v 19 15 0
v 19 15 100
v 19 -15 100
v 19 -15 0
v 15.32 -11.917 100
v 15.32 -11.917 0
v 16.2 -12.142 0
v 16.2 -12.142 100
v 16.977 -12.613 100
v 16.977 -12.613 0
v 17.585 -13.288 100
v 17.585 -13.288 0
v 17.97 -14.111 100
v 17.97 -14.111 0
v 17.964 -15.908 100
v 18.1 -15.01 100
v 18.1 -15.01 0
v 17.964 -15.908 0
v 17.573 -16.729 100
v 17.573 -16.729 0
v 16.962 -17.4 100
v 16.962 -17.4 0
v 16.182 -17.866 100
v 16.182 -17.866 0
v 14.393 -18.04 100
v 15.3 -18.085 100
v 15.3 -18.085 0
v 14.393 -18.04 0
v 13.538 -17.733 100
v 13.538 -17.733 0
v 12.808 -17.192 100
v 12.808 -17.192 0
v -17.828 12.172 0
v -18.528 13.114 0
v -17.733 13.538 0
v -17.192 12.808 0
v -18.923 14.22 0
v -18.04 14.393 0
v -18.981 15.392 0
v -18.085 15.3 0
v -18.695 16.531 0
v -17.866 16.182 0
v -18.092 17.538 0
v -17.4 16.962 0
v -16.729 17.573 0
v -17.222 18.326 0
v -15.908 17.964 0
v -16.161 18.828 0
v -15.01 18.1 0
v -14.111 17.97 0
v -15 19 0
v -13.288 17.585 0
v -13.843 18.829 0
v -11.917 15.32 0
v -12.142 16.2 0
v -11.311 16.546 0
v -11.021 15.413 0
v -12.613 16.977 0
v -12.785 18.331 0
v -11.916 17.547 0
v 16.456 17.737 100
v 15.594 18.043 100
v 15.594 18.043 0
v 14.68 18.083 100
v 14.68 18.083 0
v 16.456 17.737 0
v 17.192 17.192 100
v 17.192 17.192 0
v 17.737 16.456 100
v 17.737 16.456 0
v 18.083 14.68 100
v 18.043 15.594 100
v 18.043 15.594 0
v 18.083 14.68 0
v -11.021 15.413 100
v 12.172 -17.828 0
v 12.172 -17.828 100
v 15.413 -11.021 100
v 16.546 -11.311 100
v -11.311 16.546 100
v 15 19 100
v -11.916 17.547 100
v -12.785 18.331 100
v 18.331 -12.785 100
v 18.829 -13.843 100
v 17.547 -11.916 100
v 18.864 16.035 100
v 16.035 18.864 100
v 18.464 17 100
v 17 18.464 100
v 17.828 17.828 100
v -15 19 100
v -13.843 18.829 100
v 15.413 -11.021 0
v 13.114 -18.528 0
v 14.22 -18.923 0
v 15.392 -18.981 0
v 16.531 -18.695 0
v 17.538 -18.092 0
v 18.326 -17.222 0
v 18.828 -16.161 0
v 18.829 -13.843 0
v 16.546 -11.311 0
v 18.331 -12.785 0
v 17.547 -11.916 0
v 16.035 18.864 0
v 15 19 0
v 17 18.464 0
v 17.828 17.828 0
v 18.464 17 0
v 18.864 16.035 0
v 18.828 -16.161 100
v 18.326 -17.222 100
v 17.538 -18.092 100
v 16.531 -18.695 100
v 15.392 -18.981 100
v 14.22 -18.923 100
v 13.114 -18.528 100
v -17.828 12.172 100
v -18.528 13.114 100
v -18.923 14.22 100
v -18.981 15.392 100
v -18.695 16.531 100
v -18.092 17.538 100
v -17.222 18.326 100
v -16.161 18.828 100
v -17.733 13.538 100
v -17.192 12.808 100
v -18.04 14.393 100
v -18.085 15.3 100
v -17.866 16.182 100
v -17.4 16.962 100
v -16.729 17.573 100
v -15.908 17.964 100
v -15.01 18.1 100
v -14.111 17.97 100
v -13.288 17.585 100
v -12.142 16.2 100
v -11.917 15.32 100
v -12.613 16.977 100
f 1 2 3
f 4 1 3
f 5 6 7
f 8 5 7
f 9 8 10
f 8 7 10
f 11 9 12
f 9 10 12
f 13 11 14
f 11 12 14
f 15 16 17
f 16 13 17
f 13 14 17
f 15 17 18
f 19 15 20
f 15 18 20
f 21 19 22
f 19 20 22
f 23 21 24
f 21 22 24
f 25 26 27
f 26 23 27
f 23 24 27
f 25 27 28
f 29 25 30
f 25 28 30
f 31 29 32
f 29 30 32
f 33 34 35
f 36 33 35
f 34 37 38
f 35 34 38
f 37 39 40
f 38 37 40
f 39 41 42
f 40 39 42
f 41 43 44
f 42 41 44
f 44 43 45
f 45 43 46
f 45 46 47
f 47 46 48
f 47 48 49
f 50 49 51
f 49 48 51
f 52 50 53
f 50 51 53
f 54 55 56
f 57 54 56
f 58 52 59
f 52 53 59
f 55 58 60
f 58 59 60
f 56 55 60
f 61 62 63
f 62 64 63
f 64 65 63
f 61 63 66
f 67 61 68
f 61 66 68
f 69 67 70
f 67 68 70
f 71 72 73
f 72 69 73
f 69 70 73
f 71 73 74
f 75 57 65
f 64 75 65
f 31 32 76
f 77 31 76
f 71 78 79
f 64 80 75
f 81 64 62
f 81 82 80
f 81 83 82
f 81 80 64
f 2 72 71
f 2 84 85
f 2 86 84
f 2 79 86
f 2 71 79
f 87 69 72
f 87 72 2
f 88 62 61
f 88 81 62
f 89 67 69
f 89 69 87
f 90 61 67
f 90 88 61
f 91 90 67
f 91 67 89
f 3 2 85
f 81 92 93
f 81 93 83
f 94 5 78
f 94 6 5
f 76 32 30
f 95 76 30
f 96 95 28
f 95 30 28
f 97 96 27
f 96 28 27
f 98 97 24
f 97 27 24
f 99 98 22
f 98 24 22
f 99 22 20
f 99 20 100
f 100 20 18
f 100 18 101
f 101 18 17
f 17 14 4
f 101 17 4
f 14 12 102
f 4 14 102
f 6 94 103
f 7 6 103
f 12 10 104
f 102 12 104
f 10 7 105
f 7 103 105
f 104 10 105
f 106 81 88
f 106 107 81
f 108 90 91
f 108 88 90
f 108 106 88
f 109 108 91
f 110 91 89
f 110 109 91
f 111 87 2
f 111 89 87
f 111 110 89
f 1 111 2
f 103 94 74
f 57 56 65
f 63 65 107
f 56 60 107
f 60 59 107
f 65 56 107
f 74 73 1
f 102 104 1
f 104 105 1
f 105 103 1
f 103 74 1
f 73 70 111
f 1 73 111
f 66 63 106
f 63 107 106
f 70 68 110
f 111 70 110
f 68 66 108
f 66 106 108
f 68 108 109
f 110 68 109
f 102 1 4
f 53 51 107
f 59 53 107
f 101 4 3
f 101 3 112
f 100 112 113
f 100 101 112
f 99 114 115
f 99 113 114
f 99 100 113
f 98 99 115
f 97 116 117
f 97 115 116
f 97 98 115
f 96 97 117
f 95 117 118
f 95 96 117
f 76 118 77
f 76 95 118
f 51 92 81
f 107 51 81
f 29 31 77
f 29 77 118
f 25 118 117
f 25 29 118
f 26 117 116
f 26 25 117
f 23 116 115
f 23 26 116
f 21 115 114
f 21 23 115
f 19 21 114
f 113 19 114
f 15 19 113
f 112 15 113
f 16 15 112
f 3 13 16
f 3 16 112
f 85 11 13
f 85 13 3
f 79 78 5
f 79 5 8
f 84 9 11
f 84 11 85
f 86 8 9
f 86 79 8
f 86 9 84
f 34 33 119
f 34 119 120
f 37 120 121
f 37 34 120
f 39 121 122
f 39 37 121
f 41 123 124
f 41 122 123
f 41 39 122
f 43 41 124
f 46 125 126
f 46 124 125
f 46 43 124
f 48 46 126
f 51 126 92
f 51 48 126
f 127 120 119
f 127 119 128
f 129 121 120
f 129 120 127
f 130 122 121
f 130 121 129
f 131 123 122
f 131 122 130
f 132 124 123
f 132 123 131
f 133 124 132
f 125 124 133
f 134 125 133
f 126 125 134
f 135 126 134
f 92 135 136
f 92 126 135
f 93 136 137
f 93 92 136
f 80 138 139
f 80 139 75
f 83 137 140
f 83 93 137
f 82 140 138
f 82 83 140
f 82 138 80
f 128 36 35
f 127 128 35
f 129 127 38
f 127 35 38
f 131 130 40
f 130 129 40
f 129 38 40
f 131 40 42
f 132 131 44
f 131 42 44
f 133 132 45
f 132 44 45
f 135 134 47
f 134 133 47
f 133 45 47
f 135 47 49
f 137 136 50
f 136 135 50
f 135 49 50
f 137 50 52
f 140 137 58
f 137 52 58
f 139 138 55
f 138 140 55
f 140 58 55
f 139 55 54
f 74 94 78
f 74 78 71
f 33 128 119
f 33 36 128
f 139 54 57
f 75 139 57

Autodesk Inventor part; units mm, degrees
ref_plane "YZ Plane" through (0, 0, 0) normal (1, 0, 0) x (0, 1, 0)
ref_plane "XZ Plane" through (0, 0, 0) normal (0, 1, 0) x (-1, 0, 0)
ref_plane "XY Plane" through (0, 0, 0) normal (0, 0, 1) x (1, 0, 0)
sketch "Sketch2" plane through (0, 0, 0) normal (0, 0, 1) x (1, 0, 0)
  arc A0 (-11.9166, 15.3203) -> (-17.192, 12.808) centre (-15, 15) ccw
  arc A1 (18.0834, 14.6797) -> (14.6797, 18.0834) centre (15, 15) ccw
  arc A2 (12.808, -17.192) -> (15.3203, -11.9166) centre (15, -15) ccw
  arc A3 (12.1716, -17.8284) -> (15.4133, -11.0214) centre (15, -15) ccw
  line L0 (-15, 19) -> (15, 19)
  line L1 (19, 15) -> (19, -15)
  line L2 (-15, 15) -> (-17.8284, 12.1716)
  line L3 (-15, 15) -> (-11, 15) construction
  line L4 (-15, 15) -> (14.6797, 18.0834)
  line L5 (15, -15) -> (18.0834, 14.6797)
  line L6 (15, -15) -> (12.1716, -17.8284)
  arc A4 (-11.0214, 15.4133) -> (-17.8284, 12.1716) centre (-15, 15) ccw
  arc A5 (19, 15) -> (15, 19) centre (15, 15) ccw
  point P0 (0, 0)
  dimension "d18" = 6.2
  dimension "d19" = 6.2
  dimension "d22" = 8
  dimension "d24" = 135
extrude "Extrusion2" add sketch "Sketch2" along normal blind 100 contours A0 L2 A4 L4 | A4 L0 A5 L1 A3 L5 A1 L4 | A3 L6 A2 L5
properties part number "Cage30mm-2sides-L100mm"
